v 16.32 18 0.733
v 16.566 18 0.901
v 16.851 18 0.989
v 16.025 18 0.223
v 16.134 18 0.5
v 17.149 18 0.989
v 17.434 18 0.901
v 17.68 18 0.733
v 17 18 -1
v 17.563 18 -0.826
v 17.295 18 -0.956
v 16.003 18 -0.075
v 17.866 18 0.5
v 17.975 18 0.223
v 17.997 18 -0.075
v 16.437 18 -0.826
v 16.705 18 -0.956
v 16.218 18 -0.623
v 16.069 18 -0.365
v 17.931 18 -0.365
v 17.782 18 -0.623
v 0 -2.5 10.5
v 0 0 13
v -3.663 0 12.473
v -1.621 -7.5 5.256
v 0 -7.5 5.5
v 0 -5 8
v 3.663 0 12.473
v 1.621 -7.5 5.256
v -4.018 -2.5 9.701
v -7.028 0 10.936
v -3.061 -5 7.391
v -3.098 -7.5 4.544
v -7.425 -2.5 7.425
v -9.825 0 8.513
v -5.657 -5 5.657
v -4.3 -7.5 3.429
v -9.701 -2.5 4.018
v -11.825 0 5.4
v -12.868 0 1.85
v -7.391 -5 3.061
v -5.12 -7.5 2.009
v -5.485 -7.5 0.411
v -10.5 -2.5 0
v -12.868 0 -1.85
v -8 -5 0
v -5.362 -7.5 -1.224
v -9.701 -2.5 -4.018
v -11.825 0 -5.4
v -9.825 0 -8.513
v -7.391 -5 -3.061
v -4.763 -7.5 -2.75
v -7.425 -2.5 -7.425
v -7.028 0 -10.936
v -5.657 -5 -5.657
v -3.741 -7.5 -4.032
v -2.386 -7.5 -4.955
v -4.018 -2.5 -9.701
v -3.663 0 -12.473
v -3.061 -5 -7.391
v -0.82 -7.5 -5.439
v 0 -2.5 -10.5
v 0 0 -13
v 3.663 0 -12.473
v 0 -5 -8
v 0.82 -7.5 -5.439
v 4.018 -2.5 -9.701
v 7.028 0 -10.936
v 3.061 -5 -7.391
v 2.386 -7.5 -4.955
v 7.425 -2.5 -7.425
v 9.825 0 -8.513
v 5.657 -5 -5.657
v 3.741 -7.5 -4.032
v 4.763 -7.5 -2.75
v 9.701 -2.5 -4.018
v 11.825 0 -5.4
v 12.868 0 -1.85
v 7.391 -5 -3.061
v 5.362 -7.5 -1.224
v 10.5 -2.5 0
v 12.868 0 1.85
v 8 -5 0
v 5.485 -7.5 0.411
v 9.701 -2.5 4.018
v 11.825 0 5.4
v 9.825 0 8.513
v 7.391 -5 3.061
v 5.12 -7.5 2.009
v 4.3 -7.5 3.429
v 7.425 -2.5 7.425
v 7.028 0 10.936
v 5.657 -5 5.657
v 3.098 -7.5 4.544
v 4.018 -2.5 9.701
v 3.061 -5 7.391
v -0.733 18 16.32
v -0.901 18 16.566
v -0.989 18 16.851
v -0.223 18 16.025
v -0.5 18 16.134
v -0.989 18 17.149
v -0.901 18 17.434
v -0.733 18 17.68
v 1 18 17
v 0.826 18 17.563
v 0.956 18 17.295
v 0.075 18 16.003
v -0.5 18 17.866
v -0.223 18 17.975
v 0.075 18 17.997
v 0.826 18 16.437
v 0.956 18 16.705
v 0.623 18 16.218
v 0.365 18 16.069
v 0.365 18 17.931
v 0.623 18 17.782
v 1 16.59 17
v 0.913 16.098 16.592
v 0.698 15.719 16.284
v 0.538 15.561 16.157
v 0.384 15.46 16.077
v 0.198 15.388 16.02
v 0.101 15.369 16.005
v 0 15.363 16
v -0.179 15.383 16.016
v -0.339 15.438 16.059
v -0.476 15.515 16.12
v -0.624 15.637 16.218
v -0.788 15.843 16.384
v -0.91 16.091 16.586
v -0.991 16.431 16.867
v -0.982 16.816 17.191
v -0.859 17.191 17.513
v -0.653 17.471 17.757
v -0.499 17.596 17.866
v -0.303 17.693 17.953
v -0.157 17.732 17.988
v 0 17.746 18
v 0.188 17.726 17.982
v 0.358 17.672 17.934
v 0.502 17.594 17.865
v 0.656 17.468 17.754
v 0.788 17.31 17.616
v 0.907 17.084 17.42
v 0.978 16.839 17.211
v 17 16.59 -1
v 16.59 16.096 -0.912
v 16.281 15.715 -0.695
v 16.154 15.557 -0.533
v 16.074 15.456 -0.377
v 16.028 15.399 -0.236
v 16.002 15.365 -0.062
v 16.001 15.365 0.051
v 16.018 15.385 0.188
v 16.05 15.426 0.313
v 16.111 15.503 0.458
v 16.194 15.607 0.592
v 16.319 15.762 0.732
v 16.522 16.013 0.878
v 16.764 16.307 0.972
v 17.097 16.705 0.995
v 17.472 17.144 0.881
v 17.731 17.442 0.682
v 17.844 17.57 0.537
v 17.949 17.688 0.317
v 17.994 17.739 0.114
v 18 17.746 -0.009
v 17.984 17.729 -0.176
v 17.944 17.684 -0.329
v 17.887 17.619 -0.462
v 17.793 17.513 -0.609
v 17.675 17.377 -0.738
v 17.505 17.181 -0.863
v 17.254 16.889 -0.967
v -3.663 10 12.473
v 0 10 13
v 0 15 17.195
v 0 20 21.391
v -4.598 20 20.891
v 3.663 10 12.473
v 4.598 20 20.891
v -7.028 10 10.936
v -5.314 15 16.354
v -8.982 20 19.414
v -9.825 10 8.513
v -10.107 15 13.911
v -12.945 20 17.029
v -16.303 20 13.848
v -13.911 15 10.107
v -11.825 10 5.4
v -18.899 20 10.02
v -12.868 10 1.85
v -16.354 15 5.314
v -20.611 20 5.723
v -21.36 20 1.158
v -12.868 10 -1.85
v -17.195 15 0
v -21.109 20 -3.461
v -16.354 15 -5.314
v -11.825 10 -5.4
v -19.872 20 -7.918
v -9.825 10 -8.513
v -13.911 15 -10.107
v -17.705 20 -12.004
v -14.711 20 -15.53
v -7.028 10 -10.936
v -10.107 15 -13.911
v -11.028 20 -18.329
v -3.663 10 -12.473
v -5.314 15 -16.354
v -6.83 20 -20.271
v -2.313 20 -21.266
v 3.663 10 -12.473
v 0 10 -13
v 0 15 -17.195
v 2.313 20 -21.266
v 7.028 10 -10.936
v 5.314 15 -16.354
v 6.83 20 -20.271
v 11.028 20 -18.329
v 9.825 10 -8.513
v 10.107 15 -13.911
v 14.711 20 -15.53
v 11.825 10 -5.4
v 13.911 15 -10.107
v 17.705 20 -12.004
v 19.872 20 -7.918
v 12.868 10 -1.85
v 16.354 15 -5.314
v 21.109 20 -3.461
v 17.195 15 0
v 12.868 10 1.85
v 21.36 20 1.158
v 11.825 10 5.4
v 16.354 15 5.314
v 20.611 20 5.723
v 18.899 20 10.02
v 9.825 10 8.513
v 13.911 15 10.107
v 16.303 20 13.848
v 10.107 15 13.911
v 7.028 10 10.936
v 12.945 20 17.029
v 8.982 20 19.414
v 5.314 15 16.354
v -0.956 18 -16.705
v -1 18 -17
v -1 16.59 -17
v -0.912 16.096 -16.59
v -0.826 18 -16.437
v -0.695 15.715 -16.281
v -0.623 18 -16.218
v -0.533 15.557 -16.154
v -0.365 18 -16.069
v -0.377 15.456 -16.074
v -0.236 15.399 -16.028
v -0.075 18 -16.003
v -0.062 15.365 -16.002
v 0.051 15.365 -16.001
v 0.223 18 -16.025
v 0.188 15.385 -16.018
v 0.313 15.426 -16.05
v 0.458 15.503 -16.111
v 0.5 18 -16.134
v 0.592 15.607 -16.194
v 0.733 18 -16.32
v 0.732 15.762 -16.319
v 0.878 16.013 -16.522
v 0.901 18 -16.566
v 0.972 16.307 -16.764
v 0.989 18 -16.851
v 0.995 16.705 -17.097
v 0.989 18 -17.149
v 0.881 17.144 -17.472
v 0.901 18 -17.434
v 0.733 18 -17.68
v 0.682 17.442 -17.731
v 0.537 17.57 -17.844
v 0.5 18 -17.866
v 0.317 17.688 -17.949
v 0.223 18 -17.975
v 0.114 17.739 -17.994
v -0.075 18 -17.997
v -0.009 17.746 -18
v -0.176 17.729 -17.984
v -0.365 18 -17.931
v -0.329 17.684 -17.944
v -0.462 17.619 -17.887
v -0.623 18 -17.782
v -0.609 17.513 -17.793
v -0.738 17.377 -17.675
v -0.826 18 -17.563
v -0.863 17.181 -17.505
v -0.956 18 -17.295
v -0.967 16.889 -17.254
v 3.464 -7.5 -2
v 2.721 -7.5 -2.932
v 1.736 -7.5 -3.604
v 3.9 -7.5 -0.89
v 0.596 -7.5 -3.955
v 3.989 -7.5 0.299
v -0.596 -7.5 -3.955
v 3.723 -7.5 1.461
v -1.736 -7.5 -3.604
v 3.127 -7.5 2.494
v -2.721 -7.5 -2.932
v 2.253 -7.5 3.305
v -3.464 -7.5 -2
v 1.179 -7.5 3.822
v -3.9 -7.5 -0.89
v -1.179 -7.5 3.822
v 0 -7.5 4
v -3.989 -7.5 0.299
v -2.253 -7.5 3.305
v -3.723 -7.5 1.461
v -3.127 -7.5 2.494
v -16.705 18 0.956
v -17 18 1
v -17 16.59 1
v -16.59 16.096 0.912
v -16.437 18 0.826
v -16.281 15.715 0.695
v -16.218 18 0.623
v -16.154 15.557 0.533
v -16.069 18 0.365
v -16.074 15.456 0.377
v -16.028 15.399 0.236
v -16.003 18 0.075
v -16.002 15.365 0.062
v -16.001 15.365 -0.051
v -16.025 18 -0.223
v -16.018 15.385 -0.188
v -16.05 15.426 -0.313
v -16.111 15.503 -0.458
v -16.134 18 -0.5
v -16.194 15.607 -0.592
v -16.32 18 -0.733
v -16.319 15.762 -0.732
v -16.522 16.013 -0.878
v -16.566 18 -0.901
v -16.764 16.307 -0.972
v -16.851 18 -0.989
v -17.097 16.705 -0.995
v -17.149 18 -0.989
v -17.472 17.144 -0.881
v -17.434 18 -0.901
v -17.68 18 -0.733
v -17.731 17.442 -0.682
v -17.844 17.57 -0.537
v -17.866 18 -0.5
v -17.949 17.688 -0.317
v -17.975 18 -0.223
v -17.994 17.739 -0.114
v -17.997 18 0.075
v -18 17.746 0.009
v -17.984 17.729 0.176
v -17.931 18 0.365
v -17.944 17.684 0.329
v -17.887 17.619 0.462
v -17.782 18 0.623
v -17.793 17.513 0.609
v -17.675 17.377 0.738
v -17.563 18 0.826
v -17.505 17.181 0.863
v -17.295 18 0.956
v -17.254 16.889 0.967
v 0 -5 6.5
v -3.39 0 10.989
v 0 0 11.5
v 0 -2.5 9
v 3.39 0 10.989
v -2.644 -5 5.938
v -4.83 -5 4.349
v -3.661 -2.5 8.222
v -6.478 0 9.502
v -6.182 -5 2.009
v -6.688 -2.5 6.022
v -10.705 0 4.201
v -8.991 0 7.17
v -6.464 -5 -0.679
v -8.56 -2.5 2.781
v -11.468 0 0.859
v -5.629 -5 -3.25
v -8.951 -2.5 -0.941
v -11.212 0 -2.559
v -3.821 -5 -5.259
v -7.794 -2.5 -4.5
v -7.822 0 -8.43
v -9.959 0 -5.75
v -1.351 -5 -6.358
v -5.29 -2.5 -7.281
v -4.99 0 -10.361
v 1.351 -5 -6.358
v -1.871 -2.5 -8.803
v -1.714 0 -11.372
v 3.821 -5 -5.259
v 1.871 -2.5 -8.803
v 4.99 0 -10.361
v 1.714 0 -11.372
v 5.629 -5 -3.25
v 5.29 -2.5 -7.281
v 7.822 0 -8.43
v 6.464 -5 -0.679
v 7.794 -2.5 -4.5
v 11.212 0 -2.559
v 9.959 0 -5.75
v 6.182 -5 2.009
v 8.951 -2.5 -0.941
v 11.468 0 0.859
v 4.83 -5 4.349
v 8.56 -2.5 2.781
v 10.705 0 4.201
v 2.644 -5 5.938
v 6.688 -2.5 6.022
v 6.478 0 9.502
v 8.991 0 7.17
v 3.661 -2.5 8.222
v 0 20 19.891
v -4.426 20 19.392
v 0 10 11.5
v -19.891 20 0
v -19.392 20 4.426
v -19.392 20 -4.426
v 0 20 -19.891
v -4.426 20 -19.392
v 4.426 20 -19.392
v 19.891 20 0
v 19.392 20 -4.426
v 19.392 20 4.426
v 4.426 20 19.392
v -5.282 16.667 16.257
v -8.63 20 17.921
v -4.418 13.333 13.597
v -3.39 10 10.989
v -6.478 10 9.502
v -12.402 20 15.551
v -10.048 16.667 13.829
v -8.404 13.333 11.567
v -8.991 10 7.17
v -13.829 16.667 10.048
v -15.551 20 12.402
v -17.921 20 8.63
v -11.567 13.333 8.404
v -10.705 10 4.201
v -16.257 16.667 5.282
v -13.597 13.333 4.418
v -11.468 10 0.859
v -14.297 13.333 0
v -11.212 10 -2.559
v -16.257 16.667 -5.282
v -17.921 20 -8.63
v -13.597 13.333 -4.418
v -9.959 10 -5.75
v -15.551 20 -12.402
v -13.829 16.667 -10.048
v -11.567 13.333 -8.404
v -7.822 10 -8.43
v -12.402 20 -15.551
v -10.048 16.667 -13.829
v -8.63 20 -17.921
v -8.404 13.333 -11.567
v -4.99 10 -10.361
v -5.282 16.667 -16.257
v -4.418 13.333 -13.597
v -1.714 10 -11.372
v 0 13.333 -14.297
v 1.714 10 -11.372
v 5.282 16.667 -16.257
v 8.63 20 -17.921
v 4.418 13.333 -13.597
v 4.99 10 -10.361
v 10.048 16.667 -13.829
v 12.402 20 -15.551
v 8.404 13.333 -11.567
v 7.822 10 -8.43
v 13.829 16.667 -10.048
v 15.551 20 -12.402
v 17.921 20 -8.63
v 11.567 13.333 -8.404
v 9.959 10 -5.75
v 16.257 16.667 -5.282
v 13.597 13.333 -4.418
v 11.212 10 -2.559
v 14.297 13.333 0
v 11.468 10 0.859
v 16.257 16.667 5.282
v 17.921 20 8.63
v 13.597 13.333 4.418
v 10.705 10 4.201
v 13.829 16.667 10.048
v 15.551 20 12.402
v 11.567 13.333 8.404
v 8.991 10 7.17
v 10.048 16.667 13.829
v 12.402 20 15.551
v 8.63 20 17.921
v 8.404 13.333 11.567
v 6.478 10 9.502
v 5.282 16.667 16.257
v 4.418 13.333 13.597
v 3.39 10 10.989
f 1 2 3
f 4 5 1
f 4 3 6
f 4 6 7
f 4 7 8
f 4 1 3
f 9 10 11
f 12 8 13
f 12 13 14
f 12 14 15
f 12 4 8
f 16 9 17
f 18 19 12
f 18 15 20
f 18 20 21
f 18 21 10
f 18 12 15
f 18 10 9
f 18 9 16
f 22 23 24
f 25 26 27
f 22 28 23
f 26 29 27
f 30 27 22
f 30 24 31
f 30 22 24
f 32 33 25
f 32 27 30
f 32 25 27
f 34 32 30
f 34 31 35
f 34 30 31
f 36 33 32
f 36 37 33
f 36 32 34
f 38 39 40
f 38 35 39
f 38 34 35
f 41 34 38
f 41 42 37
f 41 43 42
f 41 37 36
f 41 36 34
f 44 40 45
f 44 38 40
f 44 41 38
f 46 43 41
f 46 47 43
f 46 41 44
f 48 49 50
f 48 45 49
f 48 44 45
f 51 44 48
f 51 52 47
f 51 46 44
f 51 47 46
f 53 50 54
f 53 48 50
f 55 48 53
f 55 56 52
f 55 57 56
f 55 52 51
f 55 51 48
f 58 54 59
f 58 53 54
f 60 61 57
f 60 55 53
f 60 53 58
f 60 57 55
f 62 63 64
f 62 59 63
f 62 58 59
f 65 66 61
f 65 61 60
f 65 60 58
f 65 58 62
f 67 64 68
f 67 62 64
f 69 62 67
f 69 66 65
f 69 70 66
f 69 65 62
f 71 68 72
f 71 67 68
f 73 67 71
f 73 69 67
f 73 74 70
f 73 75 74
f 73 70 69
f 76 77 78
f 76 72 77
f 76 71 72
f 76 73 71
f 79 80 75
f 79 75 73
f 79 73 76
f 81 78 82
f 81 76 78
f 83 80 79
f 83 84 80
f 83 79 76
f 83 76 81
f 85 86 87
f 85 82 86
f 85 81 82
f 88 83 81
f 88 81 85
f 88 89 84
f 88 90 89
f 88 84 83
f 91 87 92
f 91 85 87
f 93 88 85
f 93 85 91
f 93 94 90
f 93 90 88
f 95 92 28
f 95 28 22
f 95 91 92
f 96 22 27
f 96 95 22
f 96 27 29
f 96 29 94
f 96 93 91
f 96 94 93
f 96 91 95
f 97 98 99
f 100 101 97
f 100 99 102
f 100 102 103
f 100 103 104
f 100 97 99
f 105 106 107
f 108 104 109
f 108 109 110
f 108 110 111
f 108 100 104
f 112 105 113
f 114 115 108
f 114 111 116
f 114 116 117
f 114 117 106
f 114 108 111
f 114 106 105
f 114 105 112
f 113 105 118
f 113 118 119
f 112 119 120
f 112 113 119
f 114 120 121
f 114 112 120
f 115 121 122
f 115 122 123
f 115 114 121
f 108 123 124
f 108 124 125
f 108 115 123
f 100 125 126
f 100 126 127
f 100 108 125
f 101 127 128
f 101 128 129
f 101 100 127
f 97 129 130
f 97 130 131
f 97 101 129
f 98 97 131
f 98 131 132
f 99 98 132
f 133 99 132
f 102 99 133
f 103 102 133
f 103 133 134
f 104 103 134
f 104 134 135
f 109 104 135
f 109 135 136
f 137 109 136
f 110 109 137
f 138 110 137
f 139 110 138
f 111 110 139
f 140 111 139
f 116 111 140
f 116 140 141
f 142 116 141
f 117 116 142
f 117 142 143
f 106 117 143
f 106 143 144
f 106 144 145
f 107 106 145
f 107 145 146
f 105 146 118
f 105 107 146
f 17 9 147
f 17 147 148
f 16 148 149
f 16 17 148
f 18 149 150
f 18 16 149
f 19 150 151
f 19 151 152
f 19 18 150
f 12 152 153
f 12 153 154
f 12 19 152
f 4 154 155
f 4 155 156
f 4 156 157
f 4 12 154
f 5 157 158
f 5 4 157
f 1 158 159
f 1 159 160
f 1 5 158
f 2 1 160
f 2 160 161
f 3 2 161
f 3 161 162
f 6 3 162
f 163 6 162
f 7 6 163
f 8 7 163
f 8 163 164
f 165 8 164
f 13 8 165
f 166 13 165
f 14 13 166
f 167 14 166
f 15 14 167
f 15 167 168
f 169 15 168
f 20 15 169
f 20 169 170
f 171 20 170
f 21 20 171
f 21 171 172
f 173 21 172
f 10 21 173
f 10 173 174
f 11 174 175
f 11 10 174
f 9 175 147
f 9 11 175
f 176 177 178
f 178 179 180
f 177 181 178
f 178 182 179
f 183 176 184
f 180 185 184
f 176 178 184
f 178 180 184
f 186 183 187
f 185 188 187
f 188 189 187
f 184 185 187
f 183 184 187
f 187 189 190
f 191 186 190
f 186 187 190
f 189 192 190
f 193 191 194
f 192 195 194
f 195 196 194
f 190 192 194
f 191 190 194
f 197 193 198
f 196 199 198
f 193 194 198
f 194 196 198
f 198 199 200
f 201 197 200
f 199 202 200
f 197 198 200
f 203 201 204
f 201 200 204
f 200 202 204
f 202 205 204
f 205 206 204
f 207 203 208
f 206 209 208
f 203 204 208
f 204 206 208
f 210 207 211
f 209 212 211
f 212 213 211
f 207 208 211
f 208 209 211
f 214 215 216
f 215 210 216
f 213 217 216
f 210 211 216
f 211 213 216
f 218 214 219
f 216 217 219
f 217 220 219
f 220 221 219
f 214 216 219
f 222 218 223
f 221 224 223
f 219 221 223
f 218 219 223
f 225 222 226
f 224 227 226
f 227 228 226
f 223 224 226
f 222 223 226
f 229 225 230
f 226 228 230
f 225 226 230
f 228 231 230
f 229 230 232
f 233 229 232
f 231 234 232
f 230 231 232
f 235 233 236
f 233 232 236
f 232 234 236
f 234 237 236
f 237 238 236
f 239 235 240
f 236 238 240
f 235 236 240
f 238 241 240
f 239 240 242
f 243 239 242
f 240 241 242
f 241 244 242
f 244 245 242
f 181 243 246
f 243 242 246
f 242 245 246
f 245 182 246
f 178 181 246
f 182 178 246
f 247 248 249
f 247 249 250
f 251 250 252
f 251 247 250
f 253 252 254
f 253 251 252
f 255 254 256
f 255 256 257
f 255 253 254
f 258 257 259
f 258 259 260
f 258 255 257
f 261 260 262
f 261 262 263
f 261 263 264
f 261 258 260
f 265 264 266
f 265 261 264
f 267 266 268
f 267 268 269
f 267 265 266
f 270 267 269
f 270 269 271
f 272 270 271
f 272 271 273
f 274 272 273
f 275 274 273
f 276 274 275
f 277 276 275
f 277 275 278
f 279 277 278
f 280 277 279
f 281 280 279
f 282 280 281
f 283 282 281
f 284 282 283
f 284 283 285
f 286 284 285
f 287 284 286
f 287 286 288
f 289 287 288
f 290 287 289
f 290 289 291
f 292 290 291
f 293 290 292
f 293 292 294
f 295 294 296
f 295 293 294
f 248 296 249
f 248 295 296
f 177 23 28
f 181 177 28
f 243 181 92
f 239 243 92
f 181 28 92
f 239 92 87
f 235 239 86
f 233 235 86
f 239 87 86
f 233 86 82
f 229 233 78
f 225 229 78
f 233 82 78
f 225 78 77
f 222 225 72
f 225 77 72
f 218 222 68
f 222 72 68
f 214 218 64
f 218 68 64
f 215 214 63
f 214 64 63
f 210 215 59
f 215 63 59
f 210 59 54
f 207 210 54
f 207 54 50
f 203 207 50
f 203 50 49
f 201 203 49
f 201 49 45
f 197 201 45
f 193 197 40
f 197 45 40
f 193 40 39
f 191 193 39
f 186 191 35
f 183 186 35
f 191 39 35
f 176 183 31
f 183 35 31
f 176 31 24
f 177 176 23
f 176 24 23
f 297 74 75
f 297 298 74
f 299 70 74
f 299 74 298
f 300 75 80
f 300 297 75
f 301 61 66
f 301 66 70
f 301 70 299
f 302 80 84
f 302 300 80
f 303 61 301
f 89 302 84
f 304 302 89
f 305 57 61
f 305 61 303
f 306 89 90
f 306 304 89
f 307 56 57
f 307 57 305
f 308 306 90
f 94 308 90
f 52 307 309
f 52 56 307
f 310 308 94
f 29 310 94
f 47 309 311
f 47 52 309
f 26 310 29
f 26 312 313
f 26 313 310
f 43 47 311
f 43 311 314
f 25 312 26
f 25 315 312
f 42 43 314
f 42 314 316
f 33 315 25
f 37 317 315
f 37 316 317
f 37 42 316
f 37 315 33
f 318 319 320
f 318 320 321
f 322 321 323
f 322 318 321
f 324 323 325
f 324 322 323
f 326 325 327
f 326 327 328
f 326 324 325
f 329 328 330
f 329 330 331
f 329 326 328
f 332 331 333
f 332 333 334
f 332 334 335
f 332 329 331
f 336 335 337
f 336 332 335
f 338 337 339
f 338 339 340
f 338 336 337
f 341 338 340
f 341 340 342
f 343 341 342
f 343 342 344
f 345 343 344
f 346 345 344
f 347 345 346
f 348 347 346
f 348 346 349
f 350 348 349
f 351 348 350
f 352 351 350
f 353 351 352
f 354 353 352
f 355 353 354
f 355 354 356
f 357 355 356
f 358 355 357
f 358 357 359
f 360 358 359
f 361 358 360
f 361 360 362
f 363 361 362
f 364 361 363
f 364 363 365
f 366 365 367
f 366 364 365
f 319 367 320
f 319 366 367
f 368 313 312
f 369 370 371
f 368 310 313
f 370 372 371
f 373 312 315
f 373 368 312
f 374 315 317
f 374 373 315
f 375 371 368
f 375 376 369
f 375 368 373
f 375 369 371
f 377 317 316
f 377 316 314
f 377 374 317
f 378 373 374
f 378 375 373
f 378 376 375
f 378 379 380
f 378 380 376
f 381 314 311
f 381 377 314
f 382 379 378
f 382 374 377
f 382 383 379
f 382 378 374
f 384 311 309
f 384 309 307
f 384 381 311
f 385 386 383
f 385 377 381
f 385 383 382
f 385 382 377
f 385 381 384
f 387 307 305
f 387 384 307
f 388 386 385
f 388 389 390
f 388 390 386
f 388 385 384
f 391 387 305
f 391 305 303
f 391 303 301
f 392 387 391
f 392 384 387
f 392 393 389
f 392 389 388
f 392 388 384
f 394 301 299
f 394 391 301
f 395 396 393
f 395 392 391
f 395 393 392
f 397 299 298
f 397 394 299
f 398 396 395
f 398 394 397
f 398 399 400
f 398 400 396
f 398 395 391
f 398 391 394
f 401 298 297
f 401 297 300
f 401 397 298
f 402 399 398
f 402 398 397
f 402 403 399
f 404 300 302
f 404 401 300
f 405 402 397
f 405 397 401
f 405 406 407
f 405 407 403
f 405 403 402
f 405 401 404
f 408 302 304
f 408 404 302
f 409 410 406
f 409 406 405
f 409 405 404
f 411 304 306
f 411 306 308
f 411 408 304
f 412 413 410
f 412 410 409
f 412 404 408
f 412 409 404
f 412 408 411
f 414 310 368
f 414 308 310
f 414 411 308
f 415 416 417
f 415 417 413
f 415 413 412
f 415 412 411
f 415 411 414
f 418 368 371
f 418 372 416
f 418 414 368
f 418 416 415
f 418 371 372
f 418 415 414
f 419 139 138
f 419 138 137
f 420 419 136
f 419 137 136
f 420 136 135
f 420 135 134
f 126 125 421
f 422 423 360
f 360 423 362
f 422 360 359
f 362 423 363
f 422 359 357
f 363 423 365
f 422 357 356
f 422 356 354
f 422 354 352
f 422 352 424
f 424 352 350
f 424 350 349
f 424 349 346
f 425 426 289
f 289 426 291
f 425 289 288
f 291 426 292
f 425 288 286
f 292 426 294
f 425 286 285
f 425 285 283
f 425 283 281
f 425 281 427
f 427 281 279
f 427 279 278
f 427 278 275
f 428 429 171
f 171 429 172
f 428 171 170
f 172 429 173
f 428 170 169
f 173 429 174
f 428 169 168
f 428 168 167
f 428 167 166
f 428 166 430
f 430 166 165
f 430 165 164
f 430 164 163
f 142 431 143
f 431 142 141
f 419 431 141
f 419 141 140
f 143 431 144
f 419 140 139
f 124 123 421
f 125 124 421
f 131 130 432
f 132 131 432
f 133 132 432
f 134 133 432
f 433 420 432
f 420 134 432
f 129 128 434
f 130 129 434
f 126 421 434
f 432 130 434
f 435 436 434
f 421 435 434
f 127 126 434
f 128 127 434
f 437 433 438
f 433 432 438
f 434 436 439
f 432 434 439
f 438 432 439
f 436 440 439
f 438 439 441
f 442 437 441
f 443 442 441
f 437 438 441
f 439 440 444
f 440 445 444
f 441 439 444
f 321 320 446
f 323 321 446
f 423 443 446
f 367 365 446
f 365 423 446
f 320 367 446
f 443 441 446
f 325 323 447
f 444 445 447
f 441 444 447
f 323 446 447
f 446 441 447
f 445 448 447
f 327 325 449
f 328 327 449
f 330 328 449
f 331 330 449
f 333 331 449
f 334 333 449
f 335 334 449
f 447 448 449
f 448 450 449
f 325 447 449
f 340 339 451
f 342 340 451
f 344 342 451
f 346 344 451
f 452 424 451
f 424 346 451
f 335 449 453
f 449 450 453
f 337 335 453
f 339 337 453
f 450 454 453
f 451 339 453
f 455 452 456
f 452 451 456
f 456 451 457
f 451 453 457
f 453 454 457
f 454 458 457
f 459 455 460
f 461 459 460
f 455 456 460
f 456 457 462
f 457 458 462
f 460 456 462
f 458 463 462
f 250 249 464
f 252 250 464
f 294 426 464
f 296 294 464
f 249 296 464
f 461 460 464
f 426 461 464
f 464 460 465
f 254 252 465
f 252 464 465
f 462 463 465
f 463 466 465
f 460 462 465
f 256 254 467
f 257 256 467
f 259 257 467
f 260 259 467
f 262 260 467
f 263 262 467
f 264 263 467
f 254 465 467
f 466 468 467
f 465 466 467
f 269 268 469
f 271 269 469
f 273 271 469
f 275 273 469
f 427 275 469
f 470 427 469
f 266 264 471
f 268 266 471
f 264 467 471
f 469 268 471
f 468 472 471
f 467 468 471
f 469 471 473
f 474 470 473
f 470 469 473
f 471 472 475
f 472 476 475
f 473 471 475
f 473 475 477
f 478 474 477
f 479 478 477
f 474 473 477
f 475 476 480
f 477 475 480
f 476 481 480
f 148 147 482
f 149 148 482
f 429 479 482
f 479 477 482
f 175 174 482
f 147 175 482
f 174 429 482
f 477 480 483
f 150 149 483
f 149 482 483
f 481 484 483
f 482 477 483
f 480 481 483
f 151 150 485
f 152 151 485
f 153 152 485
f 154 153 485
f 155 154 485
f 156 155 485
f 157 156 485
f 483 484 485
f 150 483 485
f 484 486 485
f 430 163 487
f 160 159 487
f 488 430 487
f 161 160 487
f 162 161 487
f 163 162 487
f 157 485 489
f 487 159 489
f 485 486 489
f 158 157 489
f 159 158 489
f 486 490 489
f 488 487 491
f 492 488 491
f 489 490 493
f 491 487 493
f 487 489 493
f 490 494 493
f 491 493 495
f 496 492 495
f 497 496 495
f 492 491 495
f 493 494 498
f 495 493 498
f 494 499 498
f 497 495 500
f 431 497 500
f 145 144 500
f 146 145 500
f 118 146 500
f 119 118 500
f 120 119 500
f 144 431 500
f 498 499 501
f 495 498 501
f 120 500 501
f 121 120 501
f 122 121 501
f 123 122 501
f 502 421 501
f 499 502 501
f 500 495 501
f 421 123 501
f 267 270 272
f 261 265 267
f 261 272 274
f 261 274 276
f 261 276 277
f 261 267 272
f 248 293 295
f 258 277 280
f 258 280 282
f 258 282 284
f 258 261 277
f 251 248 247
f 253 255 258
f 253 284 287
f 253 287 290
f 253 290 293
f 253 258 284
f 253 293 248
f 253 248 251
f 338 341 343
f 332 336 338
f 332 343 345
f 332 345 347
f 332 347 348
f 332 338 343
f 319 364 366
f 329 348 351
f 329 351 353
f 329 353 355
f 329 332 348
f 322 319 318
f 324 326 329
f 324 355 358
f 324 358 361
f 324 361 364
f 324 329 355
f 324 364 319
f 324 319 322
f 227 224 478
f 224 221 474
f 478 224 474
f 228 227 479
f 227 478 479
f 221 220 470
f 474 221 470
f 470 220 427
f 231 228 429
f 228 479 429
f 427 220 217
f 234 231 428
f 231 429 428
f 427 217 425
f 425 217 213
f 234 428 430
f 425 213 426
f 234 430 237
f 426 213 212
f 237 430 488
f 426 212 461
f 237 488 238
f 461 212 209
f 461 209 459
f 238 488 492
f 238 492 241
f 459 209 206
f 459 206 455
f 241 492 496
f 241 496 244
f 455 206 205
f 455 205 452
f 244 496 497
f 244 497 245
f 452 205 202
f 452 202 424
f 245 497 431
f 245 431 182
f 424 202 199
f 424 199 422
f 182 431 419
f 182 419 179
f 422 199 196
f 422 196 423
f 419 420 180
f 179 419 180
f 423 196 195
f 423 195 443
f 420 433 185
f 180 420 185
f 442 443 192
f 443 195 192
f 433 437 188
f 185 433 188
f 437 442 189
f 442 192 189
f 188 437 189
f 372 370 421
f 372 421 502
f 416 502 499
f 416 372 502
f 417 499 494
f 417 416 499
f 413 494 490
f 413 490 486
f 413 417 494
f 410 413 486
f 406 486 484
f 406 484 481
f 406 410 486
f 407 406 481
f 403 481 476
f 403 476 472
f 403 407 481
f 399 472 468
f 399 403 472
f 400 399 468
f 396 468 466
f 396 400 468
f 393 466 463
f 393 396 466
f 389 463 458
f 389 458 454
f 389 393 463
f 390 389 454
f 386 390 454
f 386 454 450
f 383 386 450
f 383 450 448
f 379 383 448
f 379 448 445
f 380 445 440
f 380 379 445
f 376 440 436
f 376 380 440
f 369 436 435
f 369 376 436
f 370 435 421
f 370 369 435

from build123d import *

# Parameters (mm, degrees)
SKETCH1_R           = 13
SKETCH1_R_2         = 11.5
BOSS_EXTRUDE1_DEPTH = 10
BOSS_EXTRUDE2_REACH = 40.265
BOSS_EXTRUDE2_START = -2
SKETCH5_R           = 1
CIRPATTERN1_COUNT   = 4


with BuildPart() as part:
    # Sketch1 → Boss-Extrude1 (new body)
    with BuildSketch(Plane(origin=(0, 0, 0), x_dir=(1, 0, 0), z_dir=(0, 1, 0))):
        with Locations(Location((0, 0, 0), (0, 0, 270))):
            Circle(SKETCH1_R)
        with Locations(Location((0, 0, 0), (0, 0, 270))):
            Circle(SKETCH1_R_2, mode=Mode.SUBTRACT)
    extrude(amount=BOSS_EXTRUDE1_DEPTH)

    # Sketch4 → Revolve1 (revolve)
    with BuildSketch(Plane.XY, mode=Mode.PRIVATE) as revolve1_sk:
        Polygon((-13, 10), (-21.390996312, 20), (-19.890996312, 20), (-11.5, 10), align=None)
    revolve(revolve1_sk.sketch.rotate(Axis((0, 18.930839499, 0), (0, -1, 0)), 270), axis=Axis((0, 18.930839499, 0), (0, -1, 0)))

    # Sketch5 → Boss-Extrude2 (add, up to next)
    with BuildSketch(Plane(origin=(0, 20, 0), x_dir=(1, 0, 0), z_dir=(0, 1, 0)).offset(BOSS_EXTRUDE2_START), mode=Mode.PRIVATE) as boss_extrude2_sk1:
        with Locations(Location((-17, 0, 0), (0, 0, 270))):
            Circle(SKETCH5_R)
    boss_extrude2_tool1 = extrude(boss_extrude2_sk1.sketch, amount=-BOSS_EXTRUDE2_REACH, mode=Mode.PRIVATE) - part.part
    boss_extrude2 = boss_extrude2_tool1.solids().sort_by_distance((-17, 18, 0))[0]
    add(boss_extrude2)

    # CirPattern1: Boss-Extrude2 ×4 about axis
    cirpattern1_axis = Axis((0, 0, 0), (0, 1, 0))
    for i in range(1, CIRPATTERN1_COUNT):
        add(boss_extrude2.rotate(cirpattern1_axis, i * 360 / CIRPATTERN1_COUNT))

    # Sketch6 → Revolve2 (revolve)
    with BuildSketch(Plane.XY, mode=Mode.PRIVATE) as revolve2_sk:
        Polygon((-13, 0), (-5.5, -7.5), (-4, -7.5), (-11.5, 0), align=None)
    revolve(revolve2_sk.sketch.rotate(Axis((0, 18.930839499, 0), (0, -1, 0)), 270), axis=Axis((0, 18.930839499, 0), (0, -1, 0)))


solid = part.part
